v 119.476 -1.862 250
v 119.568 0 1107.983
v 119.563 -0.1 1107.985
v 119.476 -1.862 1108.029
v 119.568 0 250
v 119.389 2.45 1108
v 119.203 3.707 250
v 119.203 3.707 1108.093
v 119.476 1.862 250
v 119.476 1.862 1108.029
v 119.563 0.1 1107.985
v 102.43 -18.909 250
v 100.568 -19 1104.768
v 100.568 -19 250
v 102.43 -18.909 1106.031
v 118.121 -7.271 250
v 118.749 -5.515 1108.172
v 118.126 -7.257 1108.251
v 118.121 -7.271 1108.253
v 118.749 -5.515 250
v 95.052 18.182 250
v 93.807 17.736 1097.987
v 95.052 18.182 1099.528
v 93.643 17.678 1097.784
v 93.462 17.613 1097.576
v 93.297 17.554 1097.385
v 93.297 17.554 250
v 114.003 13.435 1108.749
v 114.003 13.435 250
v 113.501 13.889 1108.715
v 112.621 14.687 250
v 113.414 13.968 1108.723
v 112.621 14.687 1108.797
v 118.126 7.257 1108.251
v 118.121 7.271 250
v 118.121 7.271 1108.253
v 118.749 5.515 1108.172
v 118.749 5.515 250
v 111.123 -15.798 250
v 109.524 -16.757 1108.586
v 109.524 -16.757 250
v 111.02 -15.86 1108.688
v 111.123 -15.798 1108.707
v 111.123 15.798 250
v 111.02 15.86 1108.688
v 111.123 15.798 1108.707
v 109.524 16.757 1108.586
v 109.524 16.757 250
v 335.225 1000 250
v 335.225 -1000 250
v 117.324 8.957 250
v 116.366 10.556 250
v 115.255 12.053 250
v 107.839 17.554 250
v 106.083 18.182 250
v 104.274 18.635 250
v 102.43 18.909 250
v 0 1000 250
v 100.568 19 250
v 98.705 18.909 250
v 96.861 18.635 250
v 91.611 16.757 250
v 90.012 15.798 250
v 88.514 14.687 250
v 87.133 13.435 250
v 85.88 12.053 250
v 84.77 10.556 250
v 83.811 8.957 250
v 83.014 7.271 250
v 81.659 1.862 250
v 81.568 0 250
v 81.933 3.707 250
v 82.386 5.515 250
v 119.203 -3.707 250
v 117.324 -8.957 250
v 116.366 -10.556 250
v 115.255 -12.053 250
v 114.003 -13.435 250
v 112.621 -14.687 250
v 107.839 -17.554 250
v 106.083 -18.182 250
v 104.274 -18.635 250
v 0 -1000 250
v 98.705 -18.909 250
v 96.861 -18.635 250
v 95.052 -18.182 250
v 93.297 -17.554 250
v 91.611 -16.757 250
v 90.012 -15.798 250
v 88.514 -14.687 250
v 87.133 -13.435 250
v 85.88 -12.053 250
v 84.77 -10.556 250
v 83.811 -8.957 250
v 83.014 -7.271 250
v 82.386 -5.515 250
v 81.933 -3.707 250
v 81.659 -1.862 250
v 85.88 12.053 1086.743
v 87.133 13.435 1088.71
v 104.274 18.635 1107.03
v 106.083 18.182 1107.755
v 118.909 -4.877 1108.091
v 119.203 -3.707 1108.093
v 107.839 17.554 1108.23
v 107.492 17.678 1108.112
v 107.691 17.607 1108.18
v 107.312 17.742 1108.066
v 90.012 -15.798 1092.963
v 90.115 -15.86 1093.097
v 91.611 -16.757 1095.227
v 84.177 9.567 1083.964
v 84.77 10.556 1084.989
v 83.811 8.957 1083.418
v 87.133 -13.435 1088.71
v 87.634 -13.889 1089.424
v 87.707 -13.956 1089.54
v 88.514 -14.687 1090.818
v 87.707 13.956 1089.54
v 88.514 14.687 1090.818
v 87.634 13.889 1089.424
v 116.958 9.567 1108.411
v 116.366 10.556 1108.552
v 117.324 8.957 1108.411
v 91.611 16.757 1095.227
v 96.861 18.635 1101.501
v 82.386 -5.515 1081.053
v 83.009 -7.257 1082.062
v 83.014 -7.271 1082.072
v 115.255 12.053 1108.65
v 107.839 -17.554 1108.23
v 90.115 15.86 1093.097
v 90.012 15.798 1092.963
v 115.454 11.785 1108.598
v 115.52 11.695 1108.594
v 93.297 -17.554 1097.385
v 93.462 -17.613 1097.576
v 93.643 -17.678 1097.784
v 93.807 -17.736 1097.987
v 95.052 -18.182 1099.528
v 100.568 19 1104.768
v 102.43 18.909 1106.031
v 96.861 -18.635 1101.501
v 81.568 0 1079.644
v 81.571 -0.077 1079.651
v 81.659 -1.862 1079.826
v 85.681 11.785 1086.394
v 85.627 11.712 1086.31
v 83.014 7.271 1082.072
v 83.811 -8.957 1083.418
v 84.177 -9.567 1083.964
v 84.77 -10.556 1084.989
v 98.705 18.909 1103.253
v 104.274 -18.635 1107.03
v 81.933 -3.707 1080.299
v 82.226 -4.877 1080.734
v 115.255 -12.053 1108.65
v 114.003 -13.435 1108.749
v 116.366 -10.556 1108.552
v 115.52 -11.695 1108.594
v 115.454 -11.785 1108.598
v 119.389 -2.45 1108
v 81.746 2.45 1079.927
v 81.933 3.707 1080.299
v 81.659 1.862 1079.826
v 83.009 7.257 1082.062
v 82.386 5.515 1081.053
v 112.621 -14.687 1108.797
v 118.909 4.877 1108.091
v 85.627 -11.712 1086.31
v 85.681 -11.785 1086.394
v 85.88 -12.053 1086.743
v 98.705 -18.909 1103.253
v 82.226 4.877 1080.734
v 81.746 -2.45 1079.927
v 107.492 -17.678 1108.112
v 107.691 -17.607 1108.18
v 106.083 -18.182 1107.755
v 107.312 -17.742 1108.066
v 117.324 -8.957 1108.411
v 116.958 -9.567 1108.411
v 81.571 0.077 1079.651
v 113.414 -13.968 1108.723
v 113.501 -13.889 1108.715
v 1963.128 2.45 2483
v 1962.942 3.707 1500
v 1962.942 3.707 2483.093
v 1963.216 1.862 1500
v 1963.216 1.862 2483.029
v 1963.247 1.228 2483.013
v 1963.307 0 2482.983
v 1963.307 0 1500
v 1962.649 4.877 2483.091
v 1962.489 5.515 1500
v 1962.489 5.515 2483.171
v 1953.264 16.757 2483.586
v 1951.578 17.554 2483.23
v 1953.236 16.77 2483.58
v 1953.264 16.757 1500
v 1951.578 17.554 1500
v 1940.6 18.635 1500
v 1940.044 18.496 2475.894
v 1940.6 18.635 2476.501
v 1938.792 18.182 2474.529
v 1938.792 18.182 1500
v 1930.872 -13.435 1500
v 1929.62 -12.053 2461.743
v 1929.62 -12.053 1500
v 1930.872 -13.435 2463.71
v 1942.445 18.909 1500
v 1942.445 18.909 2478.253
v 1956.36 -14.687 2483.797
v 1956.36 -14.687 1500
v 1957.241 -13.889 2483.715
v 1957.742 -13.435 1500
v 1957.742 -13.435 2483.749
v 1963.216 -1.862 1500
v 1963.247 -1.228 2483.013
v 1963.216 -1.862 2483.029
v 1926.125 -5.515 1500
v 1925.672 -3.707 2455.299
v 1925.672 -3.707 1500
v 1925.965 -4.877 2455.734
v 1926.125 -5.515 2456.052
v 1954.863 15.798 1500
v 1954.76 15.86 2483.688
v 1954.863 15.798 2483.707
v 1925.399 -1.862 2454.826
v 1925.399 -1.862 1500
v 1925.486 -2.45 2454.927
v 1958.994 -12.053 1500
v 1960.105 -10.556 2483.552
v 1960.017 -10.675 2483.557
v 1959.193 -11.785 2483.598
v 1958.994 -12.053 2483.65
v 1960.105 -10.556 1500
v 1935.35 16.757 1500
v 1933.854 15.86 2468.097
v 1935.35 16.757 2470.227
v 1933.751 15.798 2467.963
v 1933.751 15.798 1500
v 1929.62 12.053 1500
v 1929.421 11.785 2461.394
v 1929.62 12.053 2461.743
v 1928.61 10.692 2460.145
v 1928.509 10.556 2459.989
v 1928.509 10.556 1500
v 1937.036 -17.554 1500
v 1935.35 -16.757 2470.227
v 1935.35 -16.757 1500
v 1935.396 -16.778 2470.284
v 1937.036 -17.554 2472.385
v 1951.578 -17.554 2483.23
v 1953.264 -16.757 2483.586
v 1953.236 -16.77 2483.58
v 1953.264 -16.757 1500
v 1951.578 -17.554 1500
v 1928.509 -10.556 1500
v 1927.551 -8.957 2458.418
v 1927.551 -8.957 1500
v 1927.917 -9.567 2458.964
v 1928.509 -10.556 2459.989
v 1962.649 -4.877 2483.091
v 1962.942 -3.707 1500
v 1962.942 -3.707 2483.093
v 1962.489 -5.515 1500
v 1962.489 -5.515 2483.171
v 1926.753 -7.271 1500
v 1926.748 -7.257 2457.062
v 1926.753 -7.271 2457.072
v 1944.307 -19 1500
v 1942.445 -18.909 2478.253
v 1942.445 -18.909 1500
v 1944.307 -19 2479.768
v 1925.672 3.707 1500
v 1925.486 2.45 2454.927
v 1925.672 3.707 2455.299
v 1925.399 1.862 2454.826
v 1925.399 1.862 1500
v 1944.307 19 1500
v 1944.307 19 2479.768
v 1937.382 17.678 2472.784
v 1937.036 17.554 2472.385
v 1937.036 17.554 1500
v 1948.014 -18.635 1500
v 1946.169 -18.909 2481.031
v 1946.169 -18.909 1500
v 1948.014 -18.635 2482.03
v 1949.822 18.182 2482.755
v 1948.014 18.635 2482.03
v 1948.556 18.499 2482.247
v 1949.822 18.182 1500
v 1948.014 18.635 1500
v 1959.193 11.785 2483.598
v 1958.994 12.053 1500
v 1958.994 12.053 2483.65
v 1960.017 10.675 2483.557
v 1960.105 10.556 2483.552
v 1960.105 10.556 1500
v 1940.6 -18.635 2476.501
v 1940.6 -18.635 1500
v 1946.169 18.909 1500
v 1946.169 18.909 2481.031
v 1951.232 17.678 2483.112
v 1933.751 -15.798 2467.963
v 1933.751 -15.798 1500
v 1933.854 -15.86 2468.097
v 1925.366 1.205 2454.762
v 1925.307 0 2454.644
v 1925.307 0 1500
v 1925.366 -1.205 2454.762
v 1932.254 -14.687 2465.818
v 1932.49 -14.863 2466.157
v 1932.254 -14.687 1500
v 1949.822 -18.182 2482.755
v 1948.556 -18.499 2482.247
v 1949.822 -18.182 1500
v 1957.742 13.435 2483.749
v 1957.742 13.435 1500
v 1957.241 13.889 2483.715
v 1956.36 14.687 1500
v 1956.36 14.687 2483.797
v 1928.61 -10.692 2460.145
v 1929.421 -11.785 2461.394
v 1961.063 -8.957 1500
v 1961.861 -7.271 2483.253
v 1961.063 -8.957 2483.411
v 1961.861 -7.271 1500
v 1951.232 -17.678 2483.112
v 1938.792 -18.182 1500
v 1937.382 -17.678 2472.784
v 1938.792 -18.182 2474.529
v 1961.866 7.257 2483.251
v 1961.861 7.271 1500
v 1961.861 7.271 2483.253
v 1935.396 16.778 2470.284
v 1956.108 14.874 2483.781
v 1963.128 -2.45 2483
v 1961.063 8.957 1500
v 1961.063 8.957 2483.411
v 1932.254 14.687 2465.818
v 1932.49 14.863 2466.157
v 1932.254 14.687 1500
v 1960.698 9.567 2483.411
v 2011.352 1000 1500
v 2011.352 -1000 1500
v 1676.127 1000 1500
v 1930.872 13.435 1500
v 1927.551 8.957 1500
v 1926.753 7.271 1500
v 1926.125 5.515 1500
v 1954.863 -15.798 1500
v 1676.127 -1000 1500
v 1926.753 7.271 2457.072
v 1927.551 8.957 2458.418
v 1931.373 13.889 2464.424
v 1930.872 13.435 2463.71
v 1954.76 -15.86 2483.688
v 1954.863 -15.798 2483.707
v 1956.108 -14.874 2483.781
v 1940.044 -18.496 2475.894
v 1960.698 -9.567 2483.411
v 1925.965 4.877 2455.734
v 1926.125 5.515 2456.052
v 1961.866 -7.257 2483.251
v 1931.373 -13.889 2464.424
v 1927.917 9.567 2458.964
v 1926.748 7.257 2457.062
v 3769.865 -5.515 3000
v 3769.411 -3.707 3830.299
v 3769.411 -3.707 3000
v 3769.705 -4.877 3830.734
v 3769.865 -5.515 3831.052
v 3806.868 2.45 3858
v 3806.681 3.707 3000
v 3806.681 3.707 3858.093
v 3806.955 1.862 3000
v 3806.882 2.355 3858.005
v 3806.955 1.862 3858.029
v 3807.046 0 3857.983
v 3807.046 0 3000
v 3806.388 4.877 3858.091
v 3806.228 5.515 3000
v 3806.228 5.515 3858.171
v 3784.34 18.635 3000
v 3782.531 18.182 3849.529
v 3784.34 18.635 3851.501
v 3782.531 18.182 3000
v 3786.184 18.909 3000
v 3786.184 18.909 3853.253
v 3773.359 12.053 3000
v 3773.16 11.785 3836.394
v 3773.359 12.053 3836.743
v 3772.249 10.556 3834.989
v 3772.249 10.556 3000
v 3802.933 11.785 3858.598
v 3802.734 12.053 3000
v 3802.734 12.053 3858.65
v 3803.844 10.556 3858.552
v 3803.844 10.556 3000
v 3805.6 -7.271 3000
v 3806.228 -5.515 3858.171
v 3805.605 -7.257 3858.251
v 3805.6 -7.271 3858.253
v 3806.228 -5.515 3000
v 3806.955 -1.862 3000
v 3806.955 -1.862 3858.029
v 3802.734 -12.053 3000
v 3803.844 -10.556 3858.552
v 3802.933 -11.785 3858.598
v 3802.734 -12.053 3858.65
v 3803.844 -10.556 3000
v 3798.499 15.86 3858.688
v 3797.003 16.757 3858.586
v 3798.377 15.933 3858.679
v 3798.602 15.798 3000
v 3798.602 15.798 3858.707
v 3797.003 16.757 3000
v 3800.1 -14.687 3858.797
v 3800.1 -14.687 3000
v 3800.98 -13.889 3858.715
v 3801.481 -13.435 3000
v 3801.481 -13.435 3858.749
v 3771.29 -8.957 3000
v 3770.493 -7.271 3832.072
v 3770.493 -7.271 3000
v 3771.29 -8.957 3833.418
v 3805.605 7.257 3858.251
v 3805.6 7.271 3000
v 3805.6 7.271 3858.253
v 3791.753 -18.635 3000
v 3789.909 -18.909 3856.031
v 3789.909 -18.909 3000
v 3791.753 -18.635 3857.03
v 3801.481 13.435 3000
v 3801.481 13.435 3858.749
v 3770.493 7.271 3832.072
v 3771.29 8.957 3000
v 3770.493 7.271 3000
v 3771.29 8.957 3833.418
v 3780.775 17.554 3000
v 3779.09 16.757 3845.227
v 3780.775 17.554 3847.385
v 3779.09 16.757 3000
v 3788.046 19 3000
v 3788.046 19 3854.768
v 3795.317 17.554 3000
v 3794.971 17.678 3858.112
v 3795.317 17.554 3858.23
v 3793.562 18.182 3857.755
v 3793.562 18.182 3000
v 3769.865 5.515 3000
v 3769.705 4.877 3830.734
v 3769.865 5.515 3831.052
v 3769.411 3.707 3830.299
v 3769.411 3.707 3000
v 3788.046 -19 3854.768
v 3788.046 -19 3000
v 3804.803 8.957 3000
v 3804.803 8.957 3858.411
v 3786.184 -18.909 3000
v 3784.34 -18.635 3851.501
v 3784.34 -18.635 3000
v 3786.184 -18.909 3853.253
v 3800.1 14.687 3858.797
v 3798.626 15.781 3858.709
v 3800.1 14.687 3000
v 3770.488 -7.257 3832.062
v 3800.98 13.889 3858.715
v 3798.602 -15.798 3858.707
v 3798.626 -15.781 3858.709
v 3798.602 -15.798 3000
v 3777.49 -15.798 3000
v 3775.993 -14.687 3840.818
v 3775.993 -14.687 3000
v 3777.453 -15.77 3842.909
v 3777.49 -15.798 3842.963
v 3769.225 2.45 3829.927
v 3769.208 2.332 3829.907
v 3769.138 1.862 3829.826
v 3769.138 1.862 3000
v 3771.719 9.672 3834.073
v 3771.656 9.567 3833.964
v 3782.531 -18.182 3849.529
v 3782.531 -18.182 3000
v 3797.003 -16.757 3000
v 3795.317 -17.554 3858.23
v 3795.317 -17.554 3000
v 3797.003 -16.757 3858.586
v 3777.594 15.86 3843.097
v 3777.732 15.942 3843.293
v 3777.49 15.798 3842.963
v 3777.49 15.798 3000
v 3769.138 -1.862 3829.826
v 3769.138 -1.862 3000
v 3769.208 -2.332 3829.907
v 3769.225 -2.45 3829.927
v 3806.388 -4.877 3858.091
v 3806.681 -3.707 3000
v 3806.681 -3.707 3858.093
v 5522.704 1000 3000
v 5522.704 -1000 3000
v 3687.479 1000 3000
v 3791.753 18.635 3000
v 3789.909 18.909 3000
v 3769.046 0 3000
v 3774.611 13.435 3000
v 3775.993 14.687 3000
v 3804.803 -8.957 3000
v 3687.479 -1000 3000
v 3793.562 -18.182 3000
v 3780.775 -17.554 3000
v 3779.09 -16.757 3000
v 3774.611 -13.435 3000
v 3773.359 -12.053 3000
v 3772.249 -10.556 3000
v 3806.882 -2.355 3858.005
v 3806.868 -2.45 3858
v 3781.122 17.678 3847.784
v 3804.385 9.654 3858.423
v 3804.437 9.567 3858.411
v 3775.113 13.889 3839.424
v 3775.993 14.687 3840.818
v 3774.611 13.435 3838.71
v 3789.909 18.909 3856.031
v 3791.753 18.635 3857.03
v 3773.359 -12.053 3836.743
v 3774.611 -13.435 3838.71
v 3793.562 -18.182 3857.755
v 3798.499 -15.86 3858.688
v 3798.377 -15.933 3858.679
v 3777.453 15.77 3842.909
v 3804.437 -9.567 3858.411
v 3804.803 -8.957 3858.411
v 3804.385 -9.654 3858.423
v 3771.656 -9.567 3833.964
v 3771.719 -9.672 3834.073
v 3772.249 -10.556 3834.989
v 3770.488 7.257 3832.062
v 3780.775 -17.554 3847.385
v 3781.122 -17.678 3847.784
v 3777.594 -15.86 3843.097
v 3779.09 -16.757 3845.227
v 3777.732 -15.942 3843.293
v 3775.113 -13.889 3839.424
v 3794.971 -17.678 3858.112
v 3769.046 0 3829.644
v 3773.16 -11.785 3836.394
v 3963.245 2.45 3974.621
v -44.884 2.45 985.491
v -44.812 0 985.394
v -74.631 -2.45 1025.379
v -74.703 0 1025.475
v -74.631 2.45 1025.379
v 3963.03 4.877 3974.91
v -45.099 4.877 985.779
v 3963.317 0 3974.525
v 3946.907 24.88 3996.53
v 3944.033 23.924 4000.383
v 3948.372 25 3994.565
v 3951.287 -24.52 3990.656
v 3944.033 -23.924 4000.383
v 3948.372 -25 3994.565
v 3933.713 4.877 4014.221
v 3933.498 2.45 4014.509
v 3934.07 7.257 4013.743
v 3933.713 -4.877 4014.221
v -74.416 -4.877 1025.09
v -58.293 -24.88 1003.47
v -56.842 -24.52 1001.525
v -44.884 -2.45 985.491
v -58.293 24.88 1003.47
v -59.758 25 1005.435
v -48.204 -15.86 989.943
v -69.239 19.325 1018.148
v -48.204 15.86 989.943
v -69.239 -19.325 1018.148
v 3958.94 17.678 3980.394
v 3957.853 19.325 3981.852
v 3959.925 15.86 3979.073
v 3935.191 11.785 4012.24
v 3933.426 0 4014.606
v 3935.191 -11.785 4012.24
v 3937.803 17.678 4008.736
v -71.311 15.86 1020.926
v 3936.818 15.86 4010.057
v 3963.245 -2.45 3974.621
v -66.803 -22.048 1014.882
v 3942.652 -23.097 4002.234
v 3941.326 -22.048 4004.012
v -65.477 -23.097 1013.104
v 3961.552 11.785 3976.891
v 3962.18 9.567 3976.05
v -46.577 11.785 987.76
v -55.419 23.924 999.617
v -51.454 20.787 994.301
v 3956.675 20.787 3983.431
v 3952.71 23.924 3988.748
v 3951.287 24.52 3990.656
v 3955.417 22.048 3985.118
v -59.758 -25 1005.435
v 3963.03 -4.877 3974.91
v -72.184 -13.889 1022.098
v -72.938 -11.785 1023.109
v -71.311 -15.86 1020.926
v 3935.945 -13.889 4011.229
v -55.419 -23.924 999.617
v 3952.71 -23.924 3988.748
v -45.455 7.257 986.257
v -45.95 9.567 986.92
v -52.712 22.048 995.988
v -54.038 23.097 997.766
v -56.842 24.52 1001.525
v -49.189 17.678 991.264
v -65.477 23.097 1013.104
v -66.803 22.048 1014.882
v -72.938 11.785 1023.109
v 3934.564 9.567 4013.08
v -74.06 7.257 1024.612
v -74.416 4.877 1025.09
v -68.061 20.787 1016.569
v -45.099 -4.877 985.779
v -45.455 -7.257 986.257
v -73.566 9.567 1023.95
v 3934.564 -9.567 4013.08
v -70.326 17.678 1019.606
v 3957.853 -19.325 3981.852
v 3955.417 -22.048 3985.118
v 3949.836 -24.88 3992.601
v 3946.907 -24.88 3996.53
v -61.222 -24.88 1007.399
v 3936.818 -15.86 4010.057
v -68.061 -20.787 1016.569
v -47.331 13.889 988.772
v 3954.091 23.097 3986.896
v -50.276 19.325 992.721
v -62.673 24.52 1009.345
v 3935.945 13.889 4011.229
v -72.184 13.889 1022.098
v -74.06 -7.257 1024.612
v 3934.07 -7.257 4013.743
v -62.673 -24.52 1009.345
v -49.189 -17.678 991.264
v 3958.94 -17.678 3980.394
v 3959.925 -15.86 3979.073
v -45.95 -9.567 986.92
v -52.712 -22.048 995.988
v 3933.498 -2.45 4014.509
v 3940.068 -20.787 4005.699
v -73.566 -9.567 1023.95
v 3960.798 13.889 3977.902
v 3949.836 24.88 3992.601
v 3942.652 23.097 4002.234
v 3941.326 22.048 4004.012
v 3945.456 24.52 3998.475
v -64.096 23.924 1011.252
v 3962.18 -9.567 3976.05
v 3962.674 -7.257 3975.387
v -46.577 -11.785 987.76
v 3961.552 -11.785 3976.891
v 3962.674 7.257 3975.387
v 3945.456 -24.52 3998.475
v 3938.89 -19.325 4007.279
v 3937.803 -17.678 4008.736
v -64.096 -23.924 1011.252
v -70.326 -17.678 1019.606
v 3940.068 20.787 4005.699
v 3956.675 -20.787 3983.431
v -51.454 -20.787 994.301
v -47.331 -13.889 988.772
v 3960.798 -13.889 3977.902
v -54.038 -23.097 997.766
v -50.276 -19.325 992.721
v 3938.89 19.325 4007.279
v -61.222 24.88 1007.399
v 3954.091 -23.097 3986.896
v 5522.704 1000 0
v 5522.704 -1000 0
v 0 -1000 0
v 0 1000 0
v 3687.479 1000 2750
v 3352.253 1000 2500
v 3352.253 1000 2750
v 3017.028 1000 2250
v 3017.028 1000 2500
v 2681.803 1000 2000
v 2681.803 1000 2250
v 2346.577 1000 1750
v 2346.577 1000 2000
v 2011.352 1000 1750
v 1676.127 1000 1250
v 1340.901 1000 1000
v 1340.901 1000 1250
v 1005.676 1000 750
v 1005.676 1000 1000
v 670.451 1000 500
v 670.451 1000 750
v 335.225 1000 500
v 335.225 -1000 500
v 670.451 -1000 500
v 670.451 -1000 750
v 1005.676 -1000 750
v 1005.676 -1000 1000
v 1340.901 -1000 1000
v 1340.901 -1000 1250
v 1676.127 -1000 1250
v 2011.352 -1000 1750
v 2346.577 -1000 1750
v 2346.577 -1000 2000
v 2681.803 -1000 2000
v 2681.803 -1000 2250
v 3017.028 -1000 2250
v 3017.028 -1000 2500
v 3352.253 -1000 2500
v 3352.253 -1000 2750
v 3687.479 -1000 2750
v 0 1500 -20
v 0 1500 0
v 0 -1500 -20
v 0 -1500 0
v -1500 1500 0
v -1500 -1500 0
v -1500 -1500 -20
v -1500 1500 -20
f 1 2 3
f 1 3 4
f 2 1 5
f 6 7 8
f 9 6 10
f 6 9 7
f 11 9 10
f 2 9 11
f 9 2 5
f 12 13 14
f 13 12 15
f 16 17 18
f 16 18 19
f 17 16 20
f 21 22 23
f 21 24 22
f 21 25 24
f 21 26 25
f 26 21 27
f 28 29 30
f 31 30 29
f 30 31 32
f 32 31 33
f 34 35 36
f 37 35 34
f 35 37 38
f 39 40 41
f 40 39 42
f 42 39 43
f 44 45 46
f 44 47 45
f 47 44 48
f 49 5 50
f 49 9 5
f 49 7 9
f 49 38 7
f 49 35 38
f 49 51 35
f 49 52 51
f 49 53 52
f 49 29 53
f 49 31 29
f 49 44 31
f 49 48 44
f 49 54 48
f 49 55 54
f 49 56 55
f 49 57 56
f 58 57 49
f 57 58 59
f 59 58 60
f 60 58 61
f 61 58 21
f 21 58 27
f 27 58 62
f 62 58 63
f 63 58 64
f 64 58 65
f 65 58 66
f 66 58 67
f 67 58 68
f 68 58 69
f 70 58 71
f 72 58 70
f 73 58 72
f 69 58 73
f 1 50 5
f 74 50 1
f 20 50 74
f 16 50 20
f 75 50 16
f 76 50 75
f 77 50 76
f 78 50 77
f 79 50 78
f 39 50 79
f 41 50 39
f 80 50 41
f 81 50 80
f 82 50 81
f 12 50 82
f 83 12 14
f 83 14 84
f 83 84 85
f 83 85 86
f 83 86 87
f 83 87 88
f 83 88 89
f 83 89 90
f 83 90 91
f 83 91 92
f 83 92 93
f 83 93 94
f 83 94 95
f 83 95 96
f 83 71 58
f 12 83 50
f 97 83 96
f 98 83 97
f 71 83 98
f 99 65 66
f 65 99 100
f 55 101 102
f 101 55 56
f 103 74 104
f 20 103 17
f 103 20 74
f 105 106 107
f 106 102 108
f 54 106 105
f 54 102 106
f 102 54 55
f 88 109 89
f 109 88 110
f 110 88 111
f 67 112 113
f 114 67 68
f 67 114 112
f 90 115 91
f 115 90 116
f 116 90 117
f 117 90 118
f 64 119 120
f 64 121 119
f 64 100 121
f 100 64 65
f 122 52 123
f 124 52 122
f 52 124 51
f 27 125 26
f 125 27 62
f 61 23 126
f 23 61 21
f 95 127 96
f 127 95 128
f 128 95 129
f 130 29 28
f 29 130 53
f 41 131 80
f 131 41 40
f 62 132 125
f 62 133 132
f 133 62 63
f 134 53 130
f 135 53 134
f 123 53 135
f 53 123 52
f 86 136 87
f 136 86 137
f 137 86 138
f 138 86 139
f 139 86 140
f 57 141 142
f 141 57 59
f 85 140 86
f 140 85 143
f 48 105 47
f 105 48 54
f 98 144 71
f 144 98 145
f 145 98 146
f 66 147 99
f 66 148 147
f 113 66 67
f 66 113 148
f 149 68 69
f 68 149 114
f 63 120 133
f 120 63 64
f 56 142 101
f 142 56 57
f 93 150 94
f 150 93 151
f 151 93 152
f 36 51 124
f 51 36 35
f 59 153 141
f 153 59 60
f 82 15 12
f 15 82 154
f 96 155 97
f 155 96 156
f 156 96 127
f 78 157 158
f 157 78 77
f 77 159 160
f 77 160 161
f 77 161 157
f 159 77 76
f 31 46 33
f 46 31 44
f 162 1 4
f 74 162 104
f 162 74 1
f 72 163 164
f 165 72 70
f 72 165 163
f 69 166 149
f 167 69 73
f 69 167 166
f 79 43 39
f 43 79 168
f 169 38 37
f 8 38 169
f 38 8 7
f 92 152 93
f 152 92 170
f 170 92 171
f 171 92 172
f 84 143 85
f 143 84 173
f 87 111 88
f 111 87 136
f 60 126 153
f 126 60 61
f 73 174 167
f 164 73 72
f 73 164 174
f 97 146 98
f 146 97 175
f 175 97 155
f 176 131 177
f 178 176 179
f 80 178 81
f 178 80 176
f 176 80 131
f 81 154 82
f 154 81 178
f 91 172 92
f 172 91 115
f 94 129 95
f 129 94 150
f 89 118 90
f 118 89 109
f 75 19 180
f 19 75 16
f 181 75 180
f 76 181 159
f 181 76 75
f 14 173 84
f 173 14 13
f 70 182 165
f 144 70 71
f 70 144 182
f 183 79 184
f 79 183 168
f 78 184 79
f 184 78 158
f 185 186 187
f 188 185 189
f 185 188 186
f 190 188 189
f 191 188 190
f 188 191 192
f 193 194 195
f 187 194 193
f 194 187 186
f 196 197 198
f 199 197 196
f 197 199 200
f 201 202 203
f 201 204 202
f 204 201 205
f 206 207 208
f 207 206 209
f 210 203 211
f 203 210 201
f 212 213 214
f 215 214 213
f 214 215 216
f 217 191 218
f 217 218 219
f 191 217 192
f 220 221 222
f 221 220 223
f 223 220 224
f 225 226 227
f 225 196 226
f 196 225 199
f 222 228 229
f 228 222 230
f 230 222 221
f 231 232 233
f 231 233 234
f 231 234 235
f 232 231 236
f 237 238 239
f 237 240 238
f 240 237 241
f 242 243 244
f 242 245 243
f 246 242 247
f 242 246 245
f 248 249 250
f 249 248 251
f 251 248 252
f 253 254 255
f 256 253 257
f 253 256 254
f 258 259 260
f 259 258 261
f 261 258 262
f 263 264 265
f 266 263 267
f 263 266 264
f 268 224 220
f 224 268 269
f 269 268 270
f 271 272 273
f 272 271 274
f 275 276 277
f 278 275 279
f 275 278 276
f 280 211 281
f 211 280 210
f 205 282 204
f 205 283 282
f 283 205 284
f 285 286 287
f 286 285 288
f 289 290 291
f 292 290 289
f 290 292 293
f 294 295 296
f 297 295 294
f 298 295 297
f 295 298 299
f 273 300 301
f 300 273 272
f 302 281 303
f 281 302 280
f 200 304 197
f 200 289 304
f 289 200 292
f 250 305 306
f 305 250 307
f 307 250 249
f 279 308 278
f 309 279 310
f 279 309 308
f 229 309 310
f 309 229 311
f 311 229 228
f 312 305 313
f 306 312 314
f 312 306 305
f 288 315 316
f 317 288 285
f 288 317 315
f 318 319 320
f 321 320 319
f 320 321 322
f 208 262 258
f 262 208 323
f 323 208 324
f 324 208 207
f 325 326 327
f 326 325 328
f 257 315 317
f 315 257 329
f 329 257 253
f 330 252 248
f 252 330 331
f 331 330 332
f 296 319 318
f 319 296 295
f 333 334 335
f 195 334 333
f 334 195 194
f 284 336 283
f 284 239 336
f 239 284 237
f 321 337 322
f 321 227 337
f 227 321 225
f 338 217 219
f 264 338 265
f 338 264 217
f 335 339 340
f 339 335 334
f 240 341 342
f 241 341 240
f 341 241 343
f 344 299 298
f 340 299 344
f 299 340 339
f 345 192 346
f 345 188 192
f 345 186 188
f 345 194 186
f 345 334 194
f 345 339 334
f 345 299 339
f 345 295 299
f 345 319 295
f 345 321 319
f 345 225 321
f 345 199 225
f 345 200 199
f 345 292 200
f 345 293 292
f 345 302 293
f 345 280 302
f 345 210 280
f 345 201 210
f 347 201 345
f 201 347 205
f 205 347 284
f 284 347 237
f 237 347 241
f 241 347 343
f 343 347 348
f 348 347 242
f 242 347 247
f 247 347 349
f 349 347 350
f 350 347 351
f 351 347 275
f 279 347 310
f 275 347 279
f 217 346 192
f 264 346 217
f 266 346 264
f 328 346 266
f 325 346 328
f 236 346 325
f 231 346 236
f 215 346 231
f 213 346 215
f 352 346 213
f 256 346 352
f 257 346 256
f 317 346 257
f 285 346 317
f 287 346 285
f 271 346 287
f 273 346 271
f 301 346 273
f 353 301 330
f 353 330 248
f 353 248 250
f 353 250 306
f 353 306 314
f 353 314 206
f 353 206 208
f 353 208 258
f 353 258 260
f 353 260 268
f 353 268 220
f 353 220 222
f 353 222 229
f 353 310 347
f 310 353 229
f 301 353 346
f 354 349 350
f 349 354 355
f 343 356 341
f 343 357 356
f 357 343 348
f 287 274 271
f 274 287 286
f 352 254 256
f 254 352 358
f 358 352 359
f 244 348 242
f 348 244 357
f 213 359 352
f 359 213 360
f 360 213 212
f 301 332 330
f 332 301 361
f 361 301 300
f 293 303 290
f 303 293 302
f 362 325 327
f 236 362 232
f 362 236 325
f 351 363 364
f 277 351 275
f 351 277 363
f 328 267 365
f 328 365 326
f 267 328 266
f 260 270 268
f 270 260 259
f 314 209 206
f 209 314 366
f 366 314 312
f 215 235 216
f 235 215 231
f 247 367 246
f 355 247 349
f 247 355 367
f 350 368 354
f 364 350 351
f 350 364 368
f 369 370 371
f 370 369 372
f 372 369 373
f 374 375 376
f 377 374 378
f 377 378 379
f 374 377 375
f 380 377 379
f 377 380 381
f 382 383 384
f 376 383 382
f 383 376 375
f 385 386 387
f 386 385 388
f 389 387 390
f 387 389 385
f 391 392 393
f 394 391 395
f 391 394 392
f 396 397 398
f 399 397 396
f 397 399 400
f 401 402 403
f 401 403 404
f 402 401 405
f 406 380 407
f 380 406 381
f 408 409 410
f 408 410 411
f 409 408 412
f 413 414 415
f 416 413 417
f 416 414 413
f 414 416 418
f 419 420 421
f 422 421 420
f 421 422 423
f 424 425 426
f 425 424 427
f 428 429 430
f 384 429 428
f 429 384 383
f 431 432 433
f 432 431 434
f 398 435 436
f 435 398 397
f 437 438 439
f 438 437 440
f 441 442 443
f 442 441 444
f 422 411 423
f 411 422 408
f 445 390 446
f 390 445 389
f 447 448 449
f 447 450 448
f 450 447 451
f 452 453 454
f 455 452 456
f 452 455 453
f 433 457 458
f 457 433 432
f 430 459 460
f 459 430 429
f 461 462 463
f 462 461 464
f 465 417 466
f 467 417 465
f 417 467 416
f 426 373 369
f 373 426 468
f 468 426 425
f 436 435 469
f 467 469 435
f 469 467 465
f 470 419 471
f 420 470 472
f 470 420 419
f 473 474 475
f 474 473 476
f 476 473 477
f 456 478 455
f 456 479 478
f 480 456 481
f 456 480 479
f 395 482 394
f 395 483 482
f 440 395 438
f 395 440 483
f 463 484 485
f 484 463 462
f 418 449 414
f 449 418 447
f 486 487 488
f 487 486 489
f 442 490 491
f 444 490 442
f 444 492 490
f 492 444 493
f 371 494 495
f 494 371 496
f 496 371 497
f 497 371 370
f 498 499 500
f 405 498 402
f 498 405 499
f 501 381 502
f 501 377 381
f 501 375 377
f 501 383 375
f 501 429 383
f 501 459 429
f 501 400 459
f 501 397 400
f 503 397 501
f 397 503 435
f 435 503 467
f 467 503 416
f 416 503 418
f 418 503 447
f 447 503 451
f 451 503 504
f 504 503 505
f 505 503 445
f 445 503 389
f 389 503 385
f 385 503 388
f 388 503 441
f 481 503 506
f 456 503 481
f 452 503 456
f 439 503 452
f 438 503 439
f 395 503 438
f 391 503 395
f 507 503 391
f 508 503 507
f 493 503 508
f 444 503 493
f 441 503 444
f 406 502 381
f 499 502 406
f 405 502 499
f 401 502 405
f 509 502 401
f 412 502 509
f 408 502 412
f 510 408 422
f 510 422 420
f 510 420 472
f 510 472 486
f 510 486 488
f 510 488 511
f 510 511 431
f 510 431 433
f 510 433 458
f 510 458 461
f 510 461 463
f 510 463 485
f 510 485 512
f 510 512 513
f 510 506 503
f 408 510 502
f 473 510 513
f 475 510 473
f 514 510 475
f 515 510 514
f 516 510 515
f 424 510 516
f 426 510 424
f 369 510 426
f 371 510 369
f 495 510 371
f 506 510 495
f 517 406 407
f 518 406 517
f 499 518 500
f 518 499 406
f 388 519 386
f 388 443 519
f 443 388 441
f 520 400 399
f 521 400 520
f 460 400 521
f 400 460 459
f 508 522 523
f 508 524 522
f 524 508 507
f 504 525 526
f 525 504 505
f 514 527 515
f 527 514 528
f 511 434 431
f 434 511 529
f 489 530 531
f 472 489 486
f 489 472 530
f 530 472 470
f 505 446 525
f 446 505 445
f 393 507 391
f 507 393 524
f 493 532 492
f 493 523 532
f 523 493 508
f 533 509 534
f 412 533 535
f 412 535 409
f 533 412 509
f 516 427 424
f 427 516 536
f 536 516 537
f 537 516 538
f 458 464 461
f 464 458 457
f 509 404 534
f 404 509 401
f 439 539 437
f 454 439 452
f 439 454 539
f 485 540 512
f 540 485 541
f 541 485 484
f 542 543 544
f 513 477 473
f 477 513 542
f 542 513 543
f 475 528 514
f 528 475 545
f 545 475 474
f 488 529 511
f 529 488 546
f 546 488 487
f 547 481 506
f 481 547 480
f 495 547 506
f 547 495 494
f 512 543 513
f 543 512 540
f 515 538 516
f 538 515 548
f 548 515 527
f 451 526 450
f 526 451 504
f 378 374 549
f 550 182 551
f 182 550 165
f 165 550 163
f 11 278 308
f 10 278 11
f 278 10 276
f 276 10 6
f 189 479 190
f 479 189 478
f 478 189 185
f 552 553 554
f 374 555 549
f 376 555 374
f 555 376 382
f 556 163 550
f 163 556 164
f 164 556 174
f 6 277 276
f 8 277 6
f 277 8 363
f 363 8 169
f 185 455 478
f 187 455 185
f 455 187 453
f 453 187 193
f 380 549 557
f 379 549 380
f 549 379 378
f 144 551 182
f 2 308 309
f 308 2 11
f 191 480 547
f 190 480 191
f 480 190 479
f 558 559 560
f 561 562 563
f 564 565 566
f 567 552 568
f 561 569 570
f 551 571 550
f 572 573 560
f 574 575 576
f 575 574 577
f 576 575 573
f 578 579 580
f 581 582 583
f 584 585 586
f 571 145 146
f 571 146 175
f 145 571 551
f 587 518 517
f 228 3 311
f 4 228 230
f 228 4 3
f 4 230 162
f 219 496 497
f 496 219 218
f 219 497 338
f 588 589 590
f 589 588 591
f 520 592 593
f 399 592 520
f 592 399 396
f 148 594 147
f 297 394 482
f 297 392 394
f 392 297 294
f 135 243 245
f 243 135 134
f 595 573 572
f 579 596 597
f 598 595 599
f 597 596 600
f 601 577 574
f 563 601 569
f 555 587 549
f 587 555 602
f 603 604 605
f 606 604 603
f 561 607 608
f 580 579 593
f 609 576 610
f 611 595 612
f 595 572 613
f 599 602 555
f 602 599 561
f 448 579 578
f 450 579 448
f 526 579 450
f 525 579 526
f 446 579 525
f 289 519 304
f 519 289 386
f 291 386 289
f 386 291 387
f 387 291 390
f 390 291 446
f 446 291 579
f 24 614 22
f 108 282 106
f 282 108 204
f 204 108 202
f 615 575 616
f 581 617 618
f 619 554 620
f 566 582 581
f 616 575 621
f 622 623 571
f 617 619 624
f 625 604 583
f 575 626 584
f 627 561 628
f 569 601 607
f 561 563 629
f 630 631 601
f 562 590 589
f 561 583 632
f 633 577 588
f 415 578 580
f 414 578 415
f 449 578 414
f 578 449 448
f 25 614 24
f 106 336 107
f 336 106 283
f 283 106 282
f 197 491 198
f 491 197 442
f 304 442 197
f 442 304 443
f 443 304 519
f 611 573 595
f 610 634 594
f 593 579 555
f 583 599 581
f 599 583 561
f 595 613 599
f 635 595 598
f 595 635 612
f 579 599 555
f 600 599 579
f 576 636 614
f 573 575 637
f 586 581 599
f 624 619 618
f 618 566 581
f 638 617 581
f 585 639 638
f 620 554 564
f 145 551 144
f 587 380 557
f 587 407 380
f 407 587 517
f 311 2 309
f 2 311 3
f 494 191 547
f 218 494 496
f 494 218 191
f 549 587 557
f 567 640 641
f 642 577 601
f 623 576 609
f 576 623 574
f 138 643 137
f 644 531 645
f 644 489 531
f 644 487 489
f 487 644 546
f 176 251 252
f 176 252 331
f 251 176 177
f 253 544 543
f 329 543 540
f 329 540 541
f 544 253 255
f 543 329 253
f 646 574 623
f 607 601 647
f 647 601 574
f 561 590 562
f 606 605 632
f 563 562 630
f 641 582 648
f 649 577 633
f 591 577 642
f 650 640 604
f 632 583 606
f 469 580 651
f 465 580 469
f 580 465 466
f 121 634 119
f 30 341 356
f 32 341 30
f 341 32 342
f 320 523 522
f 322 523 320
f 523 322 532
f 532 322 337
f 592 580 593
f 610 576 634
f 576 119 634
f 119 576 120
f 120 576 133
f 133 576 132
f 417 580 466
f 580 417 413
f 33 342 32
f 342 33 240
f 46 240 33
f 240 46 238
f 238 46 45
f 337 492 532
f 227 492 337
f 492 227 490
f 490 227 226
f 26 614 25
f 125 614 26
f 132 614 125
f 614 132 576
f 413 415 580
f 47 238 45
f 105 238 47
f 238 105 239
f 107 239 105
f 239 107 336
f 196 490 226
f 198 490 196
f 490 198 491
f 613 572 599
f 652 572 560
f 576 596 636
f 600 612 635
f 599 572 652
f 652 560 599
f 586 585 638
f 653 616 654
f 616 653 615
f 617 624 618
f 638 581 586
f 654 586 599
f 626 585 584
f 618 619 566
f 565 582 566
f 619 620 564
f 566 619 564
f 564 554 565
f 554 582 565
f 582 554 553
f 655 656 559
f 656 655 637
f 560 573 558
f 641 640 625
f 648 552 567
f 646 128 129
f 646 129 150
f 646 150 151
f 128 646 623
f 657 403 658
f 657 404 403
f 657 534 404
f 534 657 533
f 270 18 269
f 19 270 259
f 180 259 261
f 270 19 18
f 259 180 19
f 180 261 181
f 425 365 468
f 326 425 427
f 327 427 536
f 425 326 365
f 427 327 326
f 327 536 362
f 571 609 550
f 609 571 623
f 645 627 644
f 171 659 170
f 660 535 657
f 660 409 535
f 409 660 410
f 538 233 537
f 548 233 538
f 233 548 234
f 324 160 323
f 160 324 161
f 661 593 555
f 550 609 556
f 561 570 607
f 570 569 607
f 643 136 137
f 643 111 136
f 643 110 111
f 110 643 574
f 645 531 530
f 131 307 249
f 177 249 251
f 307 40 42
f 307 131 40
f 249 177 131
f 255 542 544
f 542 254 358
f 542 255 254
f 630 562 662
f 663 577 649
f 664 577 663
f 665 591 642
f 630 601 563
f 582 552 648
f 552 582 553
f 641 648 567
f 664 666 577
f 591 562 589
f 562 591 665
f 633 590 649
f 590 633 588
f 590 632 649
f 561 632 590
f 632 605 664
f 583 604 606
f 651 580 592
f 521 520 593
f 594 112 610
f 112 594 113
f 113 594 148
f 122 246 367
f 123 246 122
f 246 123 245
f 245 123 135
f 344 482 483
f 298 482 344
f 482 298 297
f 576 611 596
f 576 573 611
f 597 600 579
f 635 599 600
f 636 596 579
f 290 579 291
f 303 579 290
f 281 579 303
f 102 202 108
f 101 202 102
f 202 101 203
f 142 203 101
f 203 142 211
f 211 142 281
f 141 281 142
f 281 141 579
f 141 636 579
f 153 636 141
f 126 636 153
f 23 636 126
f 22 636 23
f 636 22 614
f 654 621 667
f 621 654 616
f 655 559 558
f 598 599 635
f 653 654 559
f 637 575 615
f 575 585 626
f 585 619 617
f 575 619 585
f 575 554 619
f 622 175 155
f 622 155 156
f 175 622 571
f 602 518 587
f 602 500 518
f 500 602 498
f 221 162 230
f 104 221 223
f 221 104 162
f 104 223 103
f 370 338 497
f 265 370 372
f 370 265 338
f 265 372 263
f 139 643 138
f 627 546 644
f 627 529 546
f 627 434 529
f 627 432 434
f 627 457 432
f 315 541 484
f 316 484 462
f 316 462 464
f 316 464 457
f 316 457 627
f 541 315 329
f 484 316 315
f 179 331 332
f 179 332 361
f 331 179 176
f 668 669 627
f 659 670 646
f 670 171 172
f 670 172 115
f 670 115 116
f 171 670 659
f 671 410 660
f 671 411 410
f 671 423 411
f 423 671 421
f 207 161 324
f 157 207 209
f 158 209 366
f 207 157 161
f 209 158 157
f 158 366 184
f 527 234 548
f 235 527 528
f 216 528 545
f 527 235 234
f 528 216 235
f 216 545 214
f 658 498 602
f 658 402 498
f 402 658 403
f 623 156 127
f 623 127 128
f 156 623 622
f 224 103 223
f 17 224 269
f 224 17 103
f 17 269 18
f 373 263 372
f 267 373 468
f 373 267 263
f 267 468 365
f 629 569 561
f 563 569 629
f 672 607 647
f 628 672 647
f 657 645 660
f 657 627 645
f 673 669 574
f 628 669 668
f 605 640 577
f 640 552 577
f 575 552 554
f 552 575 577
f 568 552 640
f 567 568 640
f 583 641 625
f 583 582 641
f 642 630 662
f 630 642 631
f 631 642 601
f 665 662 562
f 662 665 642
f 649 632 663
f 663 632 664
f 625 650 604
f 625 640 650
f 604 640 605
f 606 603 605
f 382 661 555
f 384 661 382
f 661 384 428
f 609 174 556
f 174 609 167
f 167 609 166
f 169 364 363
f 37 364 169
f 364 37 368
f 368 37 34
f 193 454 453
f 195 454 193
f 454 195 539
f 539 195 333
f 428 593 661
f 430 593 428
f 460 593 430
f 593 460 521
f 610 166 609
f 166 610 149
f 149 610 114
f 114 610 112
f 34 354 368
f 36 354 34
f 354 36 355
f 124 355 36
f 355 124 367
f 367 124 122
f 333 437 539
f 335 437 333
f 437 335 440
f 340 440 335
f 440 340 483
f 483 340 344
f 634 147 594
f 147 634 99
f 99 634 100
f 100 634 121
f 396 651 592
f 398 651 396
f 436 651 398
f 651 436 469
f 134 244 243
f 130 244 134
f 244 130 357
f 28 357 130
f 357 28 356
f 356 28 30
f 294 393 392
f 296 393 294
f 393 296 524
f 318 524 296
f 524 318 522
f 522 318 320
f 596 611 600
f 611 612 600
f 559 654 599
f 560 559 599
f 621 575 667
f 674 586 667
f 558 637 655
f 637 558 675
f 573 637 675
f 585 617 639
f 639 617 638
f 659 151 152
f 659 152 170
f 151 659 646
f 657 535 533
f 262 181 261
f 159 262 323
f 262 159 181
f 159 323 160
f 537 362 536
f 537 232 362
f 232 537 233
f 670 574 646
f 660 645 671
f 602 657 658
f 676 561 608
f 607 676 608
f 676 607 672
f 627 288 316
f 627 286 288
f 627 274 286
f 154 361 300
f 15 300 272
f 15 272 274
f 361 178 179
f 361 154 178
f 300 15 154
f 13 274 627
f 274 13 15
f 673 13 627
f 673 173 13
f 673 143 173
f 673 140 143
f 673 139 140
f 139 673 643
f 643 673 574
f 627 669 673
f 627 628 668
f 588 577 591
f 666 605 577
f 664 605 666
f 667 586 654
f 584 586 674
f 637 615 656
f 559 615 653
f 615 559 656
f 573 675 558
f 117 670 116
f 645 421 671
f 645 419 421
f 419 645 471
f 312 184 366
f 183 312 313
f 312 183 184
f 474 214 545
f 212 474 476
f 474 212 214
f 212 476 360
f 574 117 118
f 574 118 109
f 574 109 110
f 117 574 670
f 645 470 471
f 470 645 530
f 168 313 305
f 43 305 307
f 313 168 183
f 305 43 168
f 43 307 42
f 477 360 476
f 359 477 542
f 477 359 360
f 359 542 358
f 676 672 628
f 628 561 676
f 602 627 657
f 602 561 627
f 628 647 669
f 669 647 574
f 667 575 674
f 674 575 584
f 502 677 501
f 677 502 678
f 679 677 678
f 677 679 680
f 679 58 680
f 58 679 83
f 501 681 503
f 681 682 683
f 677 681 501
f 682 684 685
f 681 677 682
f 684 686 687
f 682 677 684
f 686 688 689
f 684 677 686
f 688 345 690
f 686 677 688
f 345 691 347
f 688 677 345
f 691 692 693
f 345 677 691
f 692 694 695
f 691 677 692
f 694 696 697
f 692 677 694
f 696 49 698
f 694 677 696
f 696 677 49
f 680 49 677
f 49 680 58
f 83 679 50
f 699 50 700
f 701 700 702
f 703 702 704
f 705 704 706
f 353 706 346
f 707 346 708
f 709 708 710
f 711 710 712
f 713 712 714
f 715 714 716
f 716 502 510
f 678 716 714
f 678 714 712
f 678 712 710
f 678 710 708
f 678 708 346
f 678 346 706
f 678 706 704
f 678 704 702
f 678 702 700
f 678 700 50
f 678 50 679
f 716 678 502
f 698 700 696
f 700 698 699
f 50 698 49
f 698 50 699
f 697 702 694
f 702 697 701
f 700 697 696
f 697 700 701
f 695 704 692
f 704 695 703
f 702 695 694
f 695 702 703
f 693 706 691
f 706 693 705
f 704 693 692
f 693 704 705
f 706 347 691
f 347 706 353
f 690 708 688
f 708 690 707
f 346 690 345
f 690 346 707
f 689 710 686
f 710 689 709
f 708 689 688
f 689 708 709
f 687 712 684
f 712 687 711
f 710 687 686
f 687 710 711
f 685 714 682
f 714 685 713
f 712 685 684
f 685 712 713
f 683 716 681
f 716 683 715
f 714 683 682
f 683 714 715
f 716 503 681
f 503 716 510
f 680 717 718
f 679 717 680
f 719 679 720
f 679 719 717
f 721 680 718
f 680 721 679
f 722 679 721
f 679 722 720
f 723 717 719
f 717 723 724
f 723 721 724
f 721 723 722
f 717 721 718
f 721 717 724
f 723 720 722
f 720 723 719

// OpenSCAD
// =====================================================
// CORRIMÃO ORIGINAL - Praça Piemonte, Cipava, Osasco
// Modelo simplificado ao que importa para o problema:
// tubo, inclinação, postes, vãos e pontas.
// Todas as medidas em milímetros.
// =====================================================

// ---------- PARÂMETROS DO CORRIMÃO ----------

// Diâmetro do tubo (medido: 50 mm; a NBR 9050 aceita até 45 mm)
diametro_tubo = 50;

// Distância entre um poste e o próximo, ao longo do tubo
vao = 2300;

// Quanto o tubo passa do primeiro e do último poste
prolongamento = 200;

// Diâmetro dos postes (ESTIMADO, não medido)
diametro_poste = 38;

// Altura do topo do tubo acima do degrau onde o poste está
altura_corrimao = 900;

// ---------- PARÂMETROS DA ESCADA ----------

// Número de degraus
num_degraus = 12;

// Altura de cada degrau (média medida)
degrau_altura = 250;

// Largura da escada
largura_escada = 2000;

// ---------- O QUE MOSTRAR ----------

// Mostrar a escada (só contexto, não faz parte do objeto)
mostrar_escada = true;

// Mostrar o kit instalado (entra na etapa do redesign)
mostrar_kit = false;

// ---------- CÁLCULOS (não precisa mexer) ----------

// O primeiro poste fica no 1º degrau e o último no patamar de cima.
// Entre eles há 2 vãos e (num_degraus - 1) degraus de subida.
distancia_postes = 2 * vao;
subida = (num_degraus - 1) * degrau_altura;

// Inclinação e profundidade dos degraus saem dessas medidas
inclinacao = asin(subida / distancia_postes);
degrau_profundidade = distancia_postes * cos(inclinacao) / (num_degraus - 1);

// Posição do primeiro poste: sobre o 1º degrau, perto da quina
x_poste1 = degrau_profundidade * 0.3;
z_eixo_poste1 = degrau_altura + altura_corrimao - diametro_tubo / 2;

// Ponto do eixo do tubo a uma distância s do primeiro poste
function ponto_tubo(s) = [
    x_poste1 + s * cos(inclinacao),
    0,
    z_eixo_poste1 + s * sin(inclinacao)
];

// Altura do piso embaixo de um ponto x
function altura_piso(x) =
    x < 0 ? 0 :
    min(num_degraus, floor(x / degrau_profundidade) + 1) * degrau_altura;

// Posição dos 3 postes ao longo do tubo
postes = [0, vao, 2 * vao];

// Comprimento total do tubo
comprimento_tubo = 2 * vao + 2 * prolongamento;

echo(str("Inclinação calculada: ", inclinacao, " graus"));
echo(str("Profundidade do degrau calculada: ", degrau_profundidade, " mm"));
echo(str("Comprimento do tubo: ", comprimento_tubo, " mm"));

$fn = 64;

// ---------- MODELO ----------

module tubo() {
    color([0.25, 0.42, 0.30])
        translate(ponto_tubo(-prolongamento))
            rotate([0, 90 - inclinacao, 0])
                cylinder(d = diametro_tubo, h = comprimento_tubo);
}

module poste(s) {
    topo = ponto_tubo(s);
    base = altura_piso(topo[0]);
    color([0.25, 0.42, 0.30])
        translate([topo[0], 0, base])
            cylinder(d = diametro_poste, h = topo[2] - base);
}

module escada() {
    color([0.88, 0.86, 0.82])
    for (k = [1 : num_degraus])
        translate([(k - 1) * degrau_profundidade,
                   -largura_escada / 2,
                   (k - 1) * degrau_altura])
            cube([(num_degraus - k + 1) * degrau_profundidade + 1500,
                  largura_escada,
                  degrau_altura]);
    // piso de baixo
    color([0.55, 0.55, 0.55])
        translate([-1500, -largura_escada / 2 - 500, -20])
            cube([1500, largura_escada + 1000, 20]);
}

module corrimao() {
    tubo();
    for (s = postes) poste(s);
}

// ---------- KIT (redesign) ----------

use <kit_pega_tatil.scad>

// Coloca uma peça do kit no tubo.
// s = posição ao longo do tubo; sentido = +1 (peça olhando
// para cima da escada) ou -1 (olhando para baixo)
module no_tubo(s, sentido) {
    a = inclinacao;
    p = ponto_tubo(s);
    translate(p)
        multmatrix([[0, -sin(a), sentido * cos(a), 0],
                    [sentido, 0, 0, 0],
                    [0, cos(a), sentido * sin(a), 0]])
            children();
}


// Pegas de meio: 3 por vão, fora dos postes (posições = início da peça)
comprimento_pega = 150;
pegas_por_vao = 3;

module kit() {
    // terminal de baixo: começa na ponta de baixo e olha para cima
    no_tubo(-prolongamento, 1) terminal_montado();
    // terminal de cima: começa na ponta de cima e olha para baixo
    no_tubo(2 * vao + prolongamento, -1) terminal_montado();
    // pegas distribuídas igualmente dentro de cada vão
    for (v = [0 : 1], k = [1 : pegas_por_vao]) {
        centro = v * vao + k * vao / (pegas_por_vao + 1);
        no_tubo(centro - comprimento_pega / 2, 1) pega_montada();
    }
}

// Mostrar original e redesign lado a lado (ignora mostrar_kit)
lado_a_lado = false;

// Distância entre as duas escadas no lado a lado
afastamento = 3200;

module cena(com_kit) {
    corrimao();
    if (mostrar_escada) escada();
    if (com_kit) kit();
}

if (lado_a_lado) {
    translate([0, afastamento / 2, 0]) cena(false);   // esquerda: original
    translate([0, -afastamento / 2, 0]) cena(true);   // direita: com o kit
} else {
    cena(mostrar_kit);
}
